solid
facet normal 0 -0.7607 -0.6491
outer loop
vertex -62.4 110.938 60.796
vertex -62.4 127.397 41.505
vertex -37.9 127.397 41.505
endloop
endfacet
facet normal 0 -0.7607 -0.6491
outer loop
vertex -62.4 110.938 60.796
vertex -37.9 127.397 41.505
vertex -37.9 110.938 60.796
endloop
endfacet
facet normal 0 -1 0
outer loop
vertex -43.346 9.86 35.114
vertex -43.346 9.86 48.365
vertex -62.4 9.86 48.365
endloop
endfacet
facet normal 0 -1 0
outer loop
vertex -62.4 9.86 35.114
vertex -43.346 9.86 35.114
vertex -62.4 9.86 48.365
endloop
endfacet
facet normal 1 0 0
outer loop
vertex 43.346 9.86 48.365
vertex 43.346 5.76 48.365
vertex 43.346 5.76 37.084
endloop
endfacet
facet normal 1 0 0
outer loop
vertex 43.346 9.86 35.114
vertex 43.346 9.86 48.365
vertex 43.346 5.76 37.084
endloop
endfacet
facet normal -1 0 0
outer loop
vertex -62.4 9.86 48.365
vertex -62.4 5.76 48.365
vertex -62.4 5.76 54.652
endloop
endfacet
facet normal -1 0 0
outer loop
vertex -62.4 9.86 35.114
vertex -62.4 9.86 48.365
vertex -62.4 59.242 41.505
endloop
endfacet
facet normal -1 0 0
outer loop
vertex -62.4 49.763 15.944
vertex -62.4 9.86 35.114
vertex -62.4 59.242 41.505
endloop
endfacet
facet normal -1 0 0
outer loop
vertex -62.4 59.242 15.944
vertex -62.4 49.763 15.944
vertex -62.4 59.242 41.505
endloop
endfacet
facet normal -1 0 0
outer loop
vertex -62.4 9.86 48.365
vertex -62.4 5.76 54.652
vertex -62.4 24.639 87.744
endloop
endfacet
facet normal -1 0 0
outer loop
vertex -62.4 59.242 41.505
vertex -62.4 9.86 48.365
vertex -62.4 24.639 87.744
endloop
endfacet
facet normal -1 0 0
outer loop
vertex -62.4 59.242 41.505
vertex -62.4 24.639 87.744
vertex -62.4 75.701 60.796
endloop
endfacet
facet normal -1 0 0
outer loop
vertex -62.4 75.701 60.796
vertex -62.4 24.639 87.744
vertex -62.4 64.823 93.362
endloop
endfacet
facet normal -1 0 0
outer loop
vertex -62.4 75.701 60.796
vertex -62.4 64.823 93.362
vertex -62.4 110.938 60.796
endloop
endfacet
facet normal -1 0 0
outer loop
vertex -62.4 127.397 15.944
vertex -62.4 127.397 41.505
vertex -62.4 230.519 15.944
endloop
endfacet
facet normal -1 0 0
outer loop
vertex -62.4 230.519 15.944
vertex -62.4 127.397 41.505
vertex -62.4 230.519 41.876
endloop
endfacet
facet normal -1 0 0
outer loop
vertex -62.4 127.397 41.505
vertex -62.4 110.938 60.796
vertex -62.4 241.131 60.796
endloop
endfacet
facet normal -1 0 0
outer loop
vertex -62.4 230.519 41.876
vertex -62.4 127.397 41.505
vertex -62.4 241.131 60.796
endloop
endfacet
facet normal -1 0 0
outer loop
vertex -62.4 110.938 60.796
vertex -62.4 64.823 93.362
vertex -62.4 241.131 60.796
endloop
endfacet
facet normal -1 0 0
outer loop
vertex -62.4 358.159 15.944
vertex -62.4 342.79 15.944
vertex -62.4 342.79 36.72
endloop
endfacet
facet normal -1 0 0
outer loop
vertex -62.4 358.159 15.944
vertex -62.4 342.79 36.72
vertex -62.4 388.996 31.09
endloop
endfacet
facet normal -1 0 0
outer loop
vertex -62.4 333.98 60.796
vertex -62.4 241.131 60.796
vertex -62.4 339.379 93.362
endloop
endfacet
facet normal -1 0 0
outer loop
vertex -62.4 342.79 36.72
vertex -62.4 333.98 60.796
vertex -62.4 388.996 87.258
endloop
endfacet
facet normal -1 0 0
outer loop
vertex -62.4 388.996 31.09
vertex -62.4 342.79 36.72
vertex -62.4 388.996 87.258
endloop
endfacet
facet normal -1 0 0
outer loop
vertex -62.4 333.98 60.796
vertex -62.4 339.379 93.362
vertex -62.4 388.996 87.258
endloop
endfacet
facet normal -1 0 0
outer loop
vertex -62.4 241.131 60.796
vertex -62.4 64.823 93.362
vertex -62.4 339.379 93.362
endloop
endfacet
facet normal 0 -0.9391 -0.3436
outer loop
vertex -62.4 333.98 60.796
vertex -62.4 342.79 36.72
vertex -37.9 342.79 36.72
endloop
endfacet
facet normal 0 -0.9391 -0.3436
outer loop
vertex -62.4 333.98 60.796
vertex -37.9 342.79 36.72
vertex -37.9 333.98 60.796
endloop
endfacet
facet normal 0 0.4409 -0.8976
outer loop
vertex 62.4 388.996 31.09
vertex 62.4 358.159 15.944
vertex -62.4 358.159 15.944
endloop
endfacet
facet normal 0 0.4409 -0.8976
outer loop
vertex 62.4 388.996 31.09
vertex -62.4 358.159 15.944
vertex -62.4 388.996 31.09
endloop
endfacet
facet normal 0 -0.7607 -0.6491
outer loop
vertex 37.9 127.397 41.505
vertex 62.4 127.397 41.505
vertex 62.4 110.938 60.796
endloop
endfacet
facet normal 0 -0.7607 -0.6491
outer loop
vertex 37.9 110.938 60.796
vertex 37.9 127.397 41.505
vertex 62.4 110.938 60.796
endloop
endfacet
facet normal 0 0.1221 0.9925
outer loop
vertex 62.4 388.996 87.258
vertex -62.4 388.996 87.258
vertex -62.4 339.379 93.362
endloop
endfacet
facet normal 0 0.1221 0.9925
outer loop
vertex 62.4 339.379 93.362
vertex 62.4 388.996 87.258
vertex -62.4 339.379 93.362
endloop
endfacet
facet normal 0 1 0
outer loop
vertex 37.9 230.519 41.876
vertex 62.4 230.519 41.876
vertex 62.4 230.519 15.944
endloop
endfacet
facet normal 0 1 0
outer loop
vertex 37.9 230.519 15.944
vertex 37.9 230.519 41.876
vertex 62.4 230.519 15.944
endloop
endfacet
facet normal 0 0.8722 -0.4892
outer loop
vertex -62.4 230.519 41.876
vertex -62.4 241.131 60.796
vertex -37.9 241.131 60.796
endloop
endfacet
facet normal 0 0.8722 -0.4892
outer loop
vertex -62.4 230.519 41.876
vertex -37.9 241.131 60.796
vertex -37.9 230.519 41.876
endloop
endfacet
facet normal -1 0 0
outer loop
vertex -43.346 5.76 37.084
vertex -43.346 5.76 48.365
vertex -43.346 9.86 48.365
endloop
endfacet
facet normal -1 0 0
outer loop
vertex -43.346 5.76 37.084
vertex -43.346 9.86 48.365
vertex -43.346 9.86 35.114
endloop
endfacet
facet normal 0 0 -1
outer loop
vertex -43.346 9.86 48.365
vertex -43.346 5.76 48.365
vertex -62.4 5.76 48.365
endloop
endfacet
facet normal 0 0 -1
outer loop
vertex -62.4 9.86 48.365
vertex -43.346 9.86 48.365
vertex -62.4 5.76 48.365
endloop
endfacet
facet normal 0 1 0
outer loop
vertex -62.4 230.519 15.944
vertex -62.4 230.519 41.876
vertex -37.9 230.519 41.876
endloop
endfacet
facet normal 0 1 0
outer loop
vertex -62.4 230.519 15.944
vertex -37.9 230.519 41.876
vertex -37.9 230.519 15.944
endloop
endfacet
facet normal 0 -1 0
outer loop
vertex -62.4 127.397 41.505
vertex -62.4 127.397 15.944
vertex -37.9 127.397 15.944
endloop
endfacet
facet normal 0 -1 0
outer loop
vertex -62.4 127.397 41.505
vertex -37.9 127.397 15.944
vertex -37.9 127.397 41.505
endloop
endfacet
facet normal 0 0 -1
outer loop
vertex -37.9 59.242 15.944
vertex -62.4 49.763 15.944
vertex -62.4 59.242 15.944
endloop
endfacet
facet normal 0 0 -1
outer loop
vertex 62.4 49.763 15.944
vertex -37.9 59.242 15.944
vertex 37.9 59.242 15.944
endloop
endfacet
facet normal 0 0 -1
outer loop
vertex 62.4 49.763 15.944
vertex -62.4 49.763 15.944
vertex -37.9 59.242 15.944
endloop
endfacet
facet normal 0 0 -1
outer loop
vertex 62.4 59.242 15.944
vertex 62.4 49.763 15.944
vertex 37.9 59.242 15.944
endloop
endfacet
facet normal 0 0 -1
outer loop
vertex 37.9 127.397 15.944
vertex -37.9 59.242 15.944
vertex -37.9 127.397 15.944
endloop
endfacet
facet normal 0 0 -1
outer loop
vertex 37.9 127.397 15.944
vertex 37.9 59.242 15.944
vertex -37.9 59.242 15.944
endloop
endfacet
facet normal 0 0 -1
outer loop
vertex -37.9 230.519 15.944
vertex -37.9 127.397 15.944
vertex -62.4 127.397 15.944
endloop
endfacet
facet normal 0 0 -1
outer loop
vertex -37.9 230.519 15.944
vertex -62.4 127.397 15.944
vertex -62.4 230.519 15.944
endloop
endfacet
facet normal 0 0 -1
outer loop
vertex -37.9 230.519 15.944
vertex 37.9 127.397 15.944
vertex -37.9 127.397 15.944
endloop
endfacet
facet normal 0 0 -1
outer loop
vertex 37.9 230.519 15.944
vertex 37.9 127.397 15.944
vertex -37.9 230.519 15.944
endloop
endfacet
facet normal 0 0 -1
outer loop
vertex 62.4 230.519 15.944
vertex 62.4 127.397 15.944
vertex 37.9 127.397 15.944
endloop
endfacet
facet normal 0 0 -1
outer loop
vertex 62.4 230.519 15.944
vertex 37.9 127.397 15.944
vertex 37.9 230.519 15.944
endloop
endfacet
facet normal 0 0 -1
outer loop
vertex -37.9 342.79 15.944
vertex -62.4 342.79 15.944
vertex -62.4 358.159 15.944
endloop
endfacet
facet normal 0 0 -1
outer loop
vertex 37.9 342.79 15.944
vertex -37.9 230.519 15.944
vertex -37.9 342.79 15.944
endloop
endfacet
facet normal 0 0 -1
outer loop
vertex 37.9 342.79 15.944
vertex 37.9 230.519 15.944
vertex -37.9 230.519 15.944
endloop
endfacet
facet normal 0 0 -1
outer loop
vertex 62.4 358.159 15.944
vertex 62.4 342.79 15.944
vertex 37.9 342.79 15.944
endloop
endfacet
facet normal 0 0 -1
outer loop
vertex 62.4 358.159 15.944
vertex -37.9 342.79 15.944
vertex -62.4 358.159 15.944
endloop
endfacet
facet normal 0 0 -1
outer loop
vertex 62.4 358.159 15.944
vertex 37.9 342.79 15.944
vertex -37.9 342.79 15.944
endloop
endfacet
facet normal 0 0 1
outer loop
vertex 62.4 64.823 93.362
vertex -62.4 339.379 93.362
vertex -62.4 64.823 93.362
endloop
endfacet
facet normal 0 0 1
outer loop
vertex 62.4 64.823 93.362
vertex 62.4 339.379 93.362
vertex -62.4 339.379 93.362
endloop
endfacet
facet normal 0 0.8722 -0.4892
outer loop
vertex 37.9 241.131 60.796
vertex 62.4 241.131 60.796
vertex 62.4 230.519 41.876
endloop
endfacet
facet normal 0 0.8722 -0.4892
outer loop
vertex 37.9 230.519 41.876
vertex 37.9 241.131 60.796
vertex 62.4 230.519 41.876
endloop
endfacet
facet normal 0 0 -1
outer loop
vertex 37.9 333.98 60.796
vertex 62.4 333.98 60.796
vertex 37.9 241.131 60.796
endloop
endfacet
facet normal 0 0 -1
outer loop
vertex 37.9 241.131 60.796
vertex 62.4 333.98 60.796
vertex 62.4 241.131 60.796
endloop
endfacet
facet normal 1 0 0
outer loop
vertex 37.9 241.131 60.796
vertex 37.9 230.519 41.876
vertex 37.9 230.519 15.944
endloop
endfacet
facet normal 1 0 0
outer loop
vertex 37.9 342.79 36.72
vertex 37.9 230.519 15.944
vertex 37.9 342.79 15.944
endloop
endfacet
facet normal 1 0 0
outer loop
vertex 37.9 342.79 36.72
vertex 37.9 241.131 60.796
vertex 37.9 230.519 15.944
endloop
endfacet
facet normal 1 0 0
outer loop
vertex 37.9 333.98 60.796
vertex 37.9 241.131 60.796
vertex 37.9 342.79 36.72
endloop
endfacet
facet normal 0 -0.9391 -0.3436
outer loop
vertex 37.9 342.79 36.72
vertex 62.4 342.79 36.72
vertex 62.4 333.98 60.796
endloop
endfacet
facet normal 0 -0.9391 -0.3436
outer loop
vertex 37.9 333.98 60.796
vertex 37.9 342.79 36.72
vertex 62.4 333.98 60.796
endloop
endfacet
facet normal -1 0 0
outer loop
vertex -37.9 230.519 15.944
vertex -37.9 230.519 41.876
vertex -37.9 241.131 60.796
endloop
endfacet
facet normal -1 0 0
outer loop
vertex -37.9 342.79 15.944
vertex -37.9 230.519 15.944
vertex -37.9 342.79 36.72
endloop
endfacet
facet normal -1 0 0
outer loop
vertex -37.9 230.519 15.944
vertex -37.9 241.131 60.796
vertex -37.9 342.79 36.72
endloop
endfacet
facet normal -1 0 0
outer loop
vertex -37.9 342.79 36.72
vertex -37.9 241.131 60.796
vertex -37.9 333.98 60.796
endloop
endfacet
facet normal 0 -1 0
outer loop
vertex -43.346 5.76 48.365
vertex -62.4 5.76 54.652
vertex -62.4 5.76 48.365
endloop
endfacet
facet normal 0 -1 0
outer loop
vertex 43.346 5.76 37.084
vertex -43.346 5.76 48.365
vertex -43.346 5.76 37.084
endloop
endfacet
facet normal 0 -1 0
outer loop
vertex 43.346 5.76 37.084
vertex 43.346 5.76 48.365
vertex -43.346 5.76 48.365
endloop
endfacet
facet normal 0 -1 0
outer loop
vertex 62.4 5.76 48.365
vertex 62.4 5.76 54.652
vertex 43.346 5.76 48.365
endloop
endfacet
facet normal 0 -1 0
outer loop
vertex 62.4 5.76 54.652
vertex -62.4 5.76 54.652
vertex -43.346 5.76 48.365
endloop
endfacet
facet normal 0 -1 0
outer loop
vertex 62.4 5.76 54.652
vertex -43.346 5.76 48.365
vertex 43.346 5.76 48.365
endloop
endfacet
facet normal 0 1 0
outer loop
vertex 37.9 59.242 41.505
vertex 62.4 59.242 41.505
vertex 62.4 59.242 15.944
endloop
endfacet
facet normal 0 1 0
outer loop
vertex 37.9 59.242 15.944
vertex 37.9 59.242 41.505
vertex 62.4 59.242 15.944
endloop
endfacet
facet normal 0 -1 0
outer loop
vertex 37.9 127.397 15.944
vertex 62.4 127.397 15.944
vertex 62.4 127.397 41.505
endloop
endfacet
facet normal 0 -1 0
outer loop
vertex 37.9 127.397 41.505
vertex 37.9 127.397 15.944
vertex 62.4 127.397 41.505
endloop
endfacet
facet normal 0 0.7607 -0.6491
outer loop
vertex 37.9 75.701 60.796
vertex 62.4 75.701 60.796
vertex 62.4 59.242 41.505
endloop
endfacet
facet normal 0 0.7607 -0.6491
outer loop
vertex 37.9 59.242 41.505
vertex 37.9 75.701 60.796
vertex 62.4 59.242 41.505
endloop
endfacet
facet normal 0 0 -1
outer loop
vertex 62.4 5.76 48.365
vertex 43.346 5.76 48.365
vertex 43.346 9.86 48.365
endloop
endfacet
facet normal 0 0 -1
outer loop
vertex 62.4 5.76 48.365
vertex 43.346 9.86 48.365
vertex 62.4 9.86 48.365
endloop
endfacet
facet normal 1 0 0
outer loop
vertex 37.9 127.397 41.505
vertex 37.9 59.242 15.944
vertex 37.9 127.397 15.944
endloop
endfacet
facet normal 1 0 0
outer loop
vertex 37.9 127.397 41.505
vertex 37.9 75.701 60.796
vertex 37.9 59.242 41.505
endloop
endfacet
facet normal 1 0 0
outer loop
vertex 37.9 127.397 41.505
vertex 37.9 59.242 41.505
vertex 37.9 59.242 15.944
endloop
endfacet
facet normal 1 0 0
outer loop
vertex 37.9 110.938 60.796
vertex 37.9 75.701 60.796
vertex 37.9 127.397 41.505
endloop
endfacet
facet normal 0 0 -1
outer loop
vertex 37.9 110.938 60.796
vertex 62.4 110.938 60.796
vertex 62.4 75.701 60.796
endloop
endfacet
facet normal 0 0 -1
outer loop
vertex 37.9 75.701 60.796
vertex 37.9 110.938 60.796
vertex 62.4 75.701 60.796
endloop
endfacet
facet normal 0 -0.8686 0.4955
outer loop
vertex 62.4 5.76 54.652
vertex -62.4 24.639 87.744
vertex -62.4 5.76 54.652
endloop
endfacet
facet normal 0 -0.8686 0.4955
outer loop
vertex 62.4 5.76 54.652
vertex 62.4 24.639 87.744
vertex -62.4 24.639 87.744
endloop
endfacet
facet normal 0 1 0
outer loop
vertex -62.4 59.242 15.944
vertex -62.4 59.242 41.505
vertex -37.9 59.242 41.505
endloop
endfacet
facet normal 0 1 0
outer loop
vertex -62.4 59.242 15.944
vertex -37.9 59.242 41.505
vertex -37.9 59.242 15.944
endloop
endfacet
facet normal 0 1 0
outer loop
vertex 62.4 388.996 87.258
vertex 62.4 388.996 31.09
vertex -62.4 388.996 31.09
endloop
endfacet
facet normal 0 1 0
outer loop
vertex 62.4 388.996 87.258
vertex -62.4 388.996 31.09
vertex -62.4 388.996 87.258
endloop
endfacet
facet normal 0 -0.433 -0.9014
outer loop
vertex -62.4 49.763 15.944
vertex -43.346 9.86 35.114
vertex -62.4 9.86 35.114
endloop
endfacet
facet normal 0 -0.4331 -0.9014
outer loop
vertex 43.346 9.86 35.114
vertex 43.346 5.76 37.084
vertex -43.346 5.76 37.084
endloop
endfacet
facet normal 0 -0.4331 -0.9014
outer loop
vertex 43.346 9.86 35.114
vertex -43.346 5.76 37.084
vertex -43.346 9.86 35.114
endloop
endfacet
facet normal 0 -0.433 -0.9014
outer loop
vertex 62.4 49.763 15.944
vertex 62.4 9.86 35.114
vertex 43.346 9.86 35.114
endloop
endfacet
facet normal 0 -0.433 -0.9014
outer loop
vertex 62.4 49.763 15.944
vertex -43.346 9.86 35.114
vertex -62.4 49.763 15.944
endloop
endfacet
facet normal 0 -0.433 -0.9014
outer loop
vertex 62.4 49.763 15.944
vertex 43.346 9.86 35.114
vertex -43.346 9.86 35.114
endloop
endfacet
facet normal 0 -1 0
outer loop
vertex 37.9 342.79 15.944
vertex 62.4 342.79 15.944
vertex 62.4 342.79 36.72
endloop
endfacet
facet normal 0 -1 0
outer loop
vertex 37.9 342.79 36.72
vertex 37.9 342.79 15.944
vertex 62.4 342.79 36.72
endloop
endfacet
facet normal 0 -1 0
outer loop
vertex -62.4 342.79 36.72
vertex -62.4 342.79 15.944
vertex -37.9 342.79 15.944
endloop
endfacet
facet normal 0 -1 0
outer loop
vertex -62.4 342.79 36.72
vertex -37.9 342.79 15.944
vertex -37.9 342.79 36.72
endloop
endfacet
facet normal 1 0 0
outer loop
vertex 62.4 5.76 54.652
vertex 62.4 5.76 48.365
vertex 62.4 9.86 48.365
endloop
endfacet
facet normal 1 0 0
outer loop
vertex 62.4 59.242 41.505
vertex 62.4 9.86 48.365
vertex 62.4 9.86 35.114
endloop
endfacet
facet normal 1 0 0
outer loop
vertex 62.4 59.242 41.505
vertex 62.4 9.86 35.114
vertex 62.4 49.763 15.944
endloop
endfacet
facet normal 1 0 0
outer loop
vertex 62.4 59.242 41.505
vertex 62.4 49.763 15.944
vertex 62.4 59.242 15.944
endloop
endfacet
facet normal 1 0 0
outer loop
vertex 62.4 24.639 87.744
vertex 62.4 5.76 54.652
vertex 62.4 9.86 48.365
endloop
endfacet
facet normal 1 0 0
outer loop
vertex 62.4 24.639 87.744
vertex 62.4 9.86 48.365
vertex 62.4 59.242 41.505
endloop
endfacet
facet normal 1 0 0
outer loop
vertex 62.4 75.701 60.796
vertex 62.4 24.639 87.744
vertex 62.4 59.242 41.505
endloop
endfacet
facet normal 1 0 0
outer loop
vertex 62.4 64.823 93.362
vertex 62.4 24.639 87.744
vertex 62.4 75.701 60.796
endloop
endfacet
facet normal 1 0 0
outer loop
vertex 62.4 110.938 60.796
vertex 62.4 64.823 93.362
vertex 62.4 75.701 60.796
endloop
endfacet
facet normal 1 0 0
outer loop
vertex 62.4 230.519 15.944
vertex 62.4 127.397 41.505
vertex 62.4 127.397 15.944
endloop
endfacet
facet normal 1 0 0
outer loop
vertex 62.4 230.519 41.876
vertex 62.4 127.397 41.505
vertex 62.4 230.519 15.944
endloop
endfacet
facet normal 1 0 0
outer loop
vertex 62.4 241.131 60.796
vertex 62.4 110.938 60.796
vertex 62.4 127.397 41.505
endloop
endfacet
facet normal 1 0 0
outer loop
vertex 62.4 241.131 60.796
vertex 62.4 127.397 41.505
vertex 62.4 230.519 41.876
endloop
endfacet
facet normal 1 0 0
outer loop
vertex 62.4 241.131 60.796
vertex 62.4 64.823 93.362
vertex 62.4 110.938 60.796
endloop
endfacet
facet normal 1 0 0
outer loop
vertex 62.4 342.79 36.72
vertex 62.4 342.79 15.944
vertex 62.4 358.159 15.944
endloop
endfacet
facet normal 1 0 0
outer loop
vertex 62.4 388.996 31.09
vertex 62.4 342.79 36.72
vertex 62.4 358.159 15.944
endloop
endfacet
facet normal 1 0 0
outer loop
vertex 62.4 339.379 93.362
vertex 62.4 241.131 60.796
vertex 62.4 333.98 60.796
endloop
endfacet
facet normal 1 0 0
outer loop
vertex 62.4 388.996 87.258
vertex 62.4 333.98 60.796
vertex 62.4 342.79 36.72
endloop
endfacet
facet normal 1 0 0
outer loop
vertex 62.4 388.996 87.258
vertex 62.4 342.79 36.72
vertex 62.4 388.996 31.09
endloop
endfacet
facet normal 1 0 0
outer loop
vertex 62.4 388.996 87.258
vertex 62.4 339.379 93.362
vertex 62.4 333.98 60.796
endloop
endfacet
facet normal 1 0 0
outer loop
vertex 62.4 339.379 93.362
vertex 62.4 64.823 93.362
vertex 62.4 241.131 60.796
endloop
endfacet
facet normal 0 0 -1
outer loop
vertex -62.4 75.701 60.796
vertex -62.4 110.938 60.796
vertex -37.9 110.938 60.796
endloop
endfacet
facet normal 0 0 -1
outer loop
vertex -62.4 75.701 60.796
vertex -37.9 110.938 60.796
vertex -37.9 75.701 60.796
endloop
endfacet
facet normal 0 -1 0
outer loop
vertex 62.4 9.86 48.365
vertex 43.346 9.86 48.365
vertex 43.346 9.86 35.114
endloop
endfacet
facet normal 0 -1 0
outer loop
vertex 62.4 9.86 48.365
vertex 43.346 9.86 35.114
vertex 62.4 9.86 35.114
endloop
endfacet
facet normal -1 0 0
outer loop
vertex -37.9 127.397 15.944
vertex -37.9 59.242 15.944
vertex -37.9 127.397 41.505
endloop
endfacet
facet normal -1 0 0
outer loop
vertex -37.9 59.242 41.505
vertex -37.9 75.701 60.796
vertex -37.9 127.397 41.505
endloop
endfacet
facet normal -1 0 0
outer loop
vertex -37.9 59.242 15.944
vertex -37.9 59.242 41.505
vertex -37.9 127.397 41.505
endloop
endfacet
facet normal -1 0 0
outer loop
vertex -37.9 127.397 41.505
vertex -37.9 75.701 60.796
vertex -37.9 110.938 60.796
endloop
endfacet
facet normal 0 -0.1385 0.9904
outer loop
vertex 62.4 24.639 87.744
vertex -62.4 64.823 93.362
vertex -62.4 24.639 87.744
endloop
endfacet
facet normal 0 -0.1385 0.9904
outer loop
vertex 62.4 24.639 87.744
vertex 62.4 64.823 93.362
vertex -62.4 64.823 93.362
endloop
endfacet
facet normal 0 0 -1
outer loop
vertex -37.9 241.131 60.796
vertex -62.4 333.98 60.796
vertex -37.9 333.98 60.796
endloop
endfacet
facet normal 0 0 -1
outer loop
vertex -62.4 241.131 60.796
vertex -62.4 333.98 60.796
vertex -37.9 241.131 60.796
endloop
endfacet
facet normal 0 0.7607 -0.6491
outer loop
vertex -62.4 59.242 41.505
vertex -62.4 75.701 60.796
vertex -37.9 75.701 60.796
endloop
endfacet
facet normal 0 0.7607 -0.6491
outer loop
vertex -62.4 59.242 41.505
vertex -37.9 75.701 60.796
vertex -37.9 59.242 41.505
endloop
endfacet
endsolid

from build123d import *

# Parameters (mm, degrees)
F1_DEPTH = 62.4
F4_DEPTH = 24.5
F5_W     = 19.0535837948
F5_H     = 11.2809054554
F5_H_2   = 2.8878487647
F6_DEPTH = 4.1


# Not quite as in the source:
# - a pattern or mirror of a feature is missing from the dataset's text; its kind, count and spacing are read off the source's solid


with BuildPart() as f1:
    # F0 (on Right) → F1 (new body)
    with BuildSketch(Plane.YZ):
        Polygon((24.6393419802, 87.7444967628), (5.7596671395, 54.6524040401), (5.7596671395, 37.0838306844), (49.7630737395, 15.9439614351), (358.1593094913, 15.9439614351), (388.9961540699, 31.0895591974), (388.9961540699, 87.2576609254), (339.3792808056, 93.3623313904), (64.8232772946, 93.3623313904), align=None)
    extrude(amount=F1_DEPTH)

    # F2: F1 across plane


with BuildPart() as f1_1:
    add(f1.part)
    add(f1.part.mirror(Plane.YZ))

    # F3 (on face) → F4 (cut)
    with BuildSketch(Plane.YZ.offset(62.4)):
        Polygon((59.2419728637, 15.9439614351), (127.3969262838, 15.9439614351), (127.3969262838, 41.5049567819), (110.9381020069, 60.795918107), (75.7007971406, 60.795918107), (59.2419728637, 41.5049567819), align=None)
        Polygon((230.519130826, 15.9439614351), (342.7896499634, 15.9439614351), (342.7896499634, 36.7200672626), (333.9802026749, 60.795918107), (241.1305308342, 60.795918107), (230.519130826, 41.8756008148), align=None)
    f4 = extrude(amount=-F4_DEPTH, mode=Mode.SUBTRACT)

    # F4_copies: F4 across plane
    add(f4.mirror(Plane(origin=(0, 0, 0), x_dir=(0, 0, -1), z_dir=(-1, 0, 0))), mode=Mode.SUBTRACT)

    # F5 (on face) → F6 (cut)
    with BuildSketch(Plane.XZ.offset(-5.7596671395)):
        with Locations((52.8732081026, 42.7242834121)):
            Rectangle(F5_W, F5_H)
        with Locations((52.8732081026, 35.6399063021)):
            Rectangle(F5_W, F5_H_2)
    f6 = extrude(amount=-F6_DEPTH, mode=Mode.SUBTRACT)

    # F6_copies: F6 across plane
    add(f6.mirror(Plane(origin=(0, 0, 0), x_dir=(0, 0, -1), z_dir=(-1, 0, 0))), mode=Mode.SUBTRACT)


solid = f1_1.part
